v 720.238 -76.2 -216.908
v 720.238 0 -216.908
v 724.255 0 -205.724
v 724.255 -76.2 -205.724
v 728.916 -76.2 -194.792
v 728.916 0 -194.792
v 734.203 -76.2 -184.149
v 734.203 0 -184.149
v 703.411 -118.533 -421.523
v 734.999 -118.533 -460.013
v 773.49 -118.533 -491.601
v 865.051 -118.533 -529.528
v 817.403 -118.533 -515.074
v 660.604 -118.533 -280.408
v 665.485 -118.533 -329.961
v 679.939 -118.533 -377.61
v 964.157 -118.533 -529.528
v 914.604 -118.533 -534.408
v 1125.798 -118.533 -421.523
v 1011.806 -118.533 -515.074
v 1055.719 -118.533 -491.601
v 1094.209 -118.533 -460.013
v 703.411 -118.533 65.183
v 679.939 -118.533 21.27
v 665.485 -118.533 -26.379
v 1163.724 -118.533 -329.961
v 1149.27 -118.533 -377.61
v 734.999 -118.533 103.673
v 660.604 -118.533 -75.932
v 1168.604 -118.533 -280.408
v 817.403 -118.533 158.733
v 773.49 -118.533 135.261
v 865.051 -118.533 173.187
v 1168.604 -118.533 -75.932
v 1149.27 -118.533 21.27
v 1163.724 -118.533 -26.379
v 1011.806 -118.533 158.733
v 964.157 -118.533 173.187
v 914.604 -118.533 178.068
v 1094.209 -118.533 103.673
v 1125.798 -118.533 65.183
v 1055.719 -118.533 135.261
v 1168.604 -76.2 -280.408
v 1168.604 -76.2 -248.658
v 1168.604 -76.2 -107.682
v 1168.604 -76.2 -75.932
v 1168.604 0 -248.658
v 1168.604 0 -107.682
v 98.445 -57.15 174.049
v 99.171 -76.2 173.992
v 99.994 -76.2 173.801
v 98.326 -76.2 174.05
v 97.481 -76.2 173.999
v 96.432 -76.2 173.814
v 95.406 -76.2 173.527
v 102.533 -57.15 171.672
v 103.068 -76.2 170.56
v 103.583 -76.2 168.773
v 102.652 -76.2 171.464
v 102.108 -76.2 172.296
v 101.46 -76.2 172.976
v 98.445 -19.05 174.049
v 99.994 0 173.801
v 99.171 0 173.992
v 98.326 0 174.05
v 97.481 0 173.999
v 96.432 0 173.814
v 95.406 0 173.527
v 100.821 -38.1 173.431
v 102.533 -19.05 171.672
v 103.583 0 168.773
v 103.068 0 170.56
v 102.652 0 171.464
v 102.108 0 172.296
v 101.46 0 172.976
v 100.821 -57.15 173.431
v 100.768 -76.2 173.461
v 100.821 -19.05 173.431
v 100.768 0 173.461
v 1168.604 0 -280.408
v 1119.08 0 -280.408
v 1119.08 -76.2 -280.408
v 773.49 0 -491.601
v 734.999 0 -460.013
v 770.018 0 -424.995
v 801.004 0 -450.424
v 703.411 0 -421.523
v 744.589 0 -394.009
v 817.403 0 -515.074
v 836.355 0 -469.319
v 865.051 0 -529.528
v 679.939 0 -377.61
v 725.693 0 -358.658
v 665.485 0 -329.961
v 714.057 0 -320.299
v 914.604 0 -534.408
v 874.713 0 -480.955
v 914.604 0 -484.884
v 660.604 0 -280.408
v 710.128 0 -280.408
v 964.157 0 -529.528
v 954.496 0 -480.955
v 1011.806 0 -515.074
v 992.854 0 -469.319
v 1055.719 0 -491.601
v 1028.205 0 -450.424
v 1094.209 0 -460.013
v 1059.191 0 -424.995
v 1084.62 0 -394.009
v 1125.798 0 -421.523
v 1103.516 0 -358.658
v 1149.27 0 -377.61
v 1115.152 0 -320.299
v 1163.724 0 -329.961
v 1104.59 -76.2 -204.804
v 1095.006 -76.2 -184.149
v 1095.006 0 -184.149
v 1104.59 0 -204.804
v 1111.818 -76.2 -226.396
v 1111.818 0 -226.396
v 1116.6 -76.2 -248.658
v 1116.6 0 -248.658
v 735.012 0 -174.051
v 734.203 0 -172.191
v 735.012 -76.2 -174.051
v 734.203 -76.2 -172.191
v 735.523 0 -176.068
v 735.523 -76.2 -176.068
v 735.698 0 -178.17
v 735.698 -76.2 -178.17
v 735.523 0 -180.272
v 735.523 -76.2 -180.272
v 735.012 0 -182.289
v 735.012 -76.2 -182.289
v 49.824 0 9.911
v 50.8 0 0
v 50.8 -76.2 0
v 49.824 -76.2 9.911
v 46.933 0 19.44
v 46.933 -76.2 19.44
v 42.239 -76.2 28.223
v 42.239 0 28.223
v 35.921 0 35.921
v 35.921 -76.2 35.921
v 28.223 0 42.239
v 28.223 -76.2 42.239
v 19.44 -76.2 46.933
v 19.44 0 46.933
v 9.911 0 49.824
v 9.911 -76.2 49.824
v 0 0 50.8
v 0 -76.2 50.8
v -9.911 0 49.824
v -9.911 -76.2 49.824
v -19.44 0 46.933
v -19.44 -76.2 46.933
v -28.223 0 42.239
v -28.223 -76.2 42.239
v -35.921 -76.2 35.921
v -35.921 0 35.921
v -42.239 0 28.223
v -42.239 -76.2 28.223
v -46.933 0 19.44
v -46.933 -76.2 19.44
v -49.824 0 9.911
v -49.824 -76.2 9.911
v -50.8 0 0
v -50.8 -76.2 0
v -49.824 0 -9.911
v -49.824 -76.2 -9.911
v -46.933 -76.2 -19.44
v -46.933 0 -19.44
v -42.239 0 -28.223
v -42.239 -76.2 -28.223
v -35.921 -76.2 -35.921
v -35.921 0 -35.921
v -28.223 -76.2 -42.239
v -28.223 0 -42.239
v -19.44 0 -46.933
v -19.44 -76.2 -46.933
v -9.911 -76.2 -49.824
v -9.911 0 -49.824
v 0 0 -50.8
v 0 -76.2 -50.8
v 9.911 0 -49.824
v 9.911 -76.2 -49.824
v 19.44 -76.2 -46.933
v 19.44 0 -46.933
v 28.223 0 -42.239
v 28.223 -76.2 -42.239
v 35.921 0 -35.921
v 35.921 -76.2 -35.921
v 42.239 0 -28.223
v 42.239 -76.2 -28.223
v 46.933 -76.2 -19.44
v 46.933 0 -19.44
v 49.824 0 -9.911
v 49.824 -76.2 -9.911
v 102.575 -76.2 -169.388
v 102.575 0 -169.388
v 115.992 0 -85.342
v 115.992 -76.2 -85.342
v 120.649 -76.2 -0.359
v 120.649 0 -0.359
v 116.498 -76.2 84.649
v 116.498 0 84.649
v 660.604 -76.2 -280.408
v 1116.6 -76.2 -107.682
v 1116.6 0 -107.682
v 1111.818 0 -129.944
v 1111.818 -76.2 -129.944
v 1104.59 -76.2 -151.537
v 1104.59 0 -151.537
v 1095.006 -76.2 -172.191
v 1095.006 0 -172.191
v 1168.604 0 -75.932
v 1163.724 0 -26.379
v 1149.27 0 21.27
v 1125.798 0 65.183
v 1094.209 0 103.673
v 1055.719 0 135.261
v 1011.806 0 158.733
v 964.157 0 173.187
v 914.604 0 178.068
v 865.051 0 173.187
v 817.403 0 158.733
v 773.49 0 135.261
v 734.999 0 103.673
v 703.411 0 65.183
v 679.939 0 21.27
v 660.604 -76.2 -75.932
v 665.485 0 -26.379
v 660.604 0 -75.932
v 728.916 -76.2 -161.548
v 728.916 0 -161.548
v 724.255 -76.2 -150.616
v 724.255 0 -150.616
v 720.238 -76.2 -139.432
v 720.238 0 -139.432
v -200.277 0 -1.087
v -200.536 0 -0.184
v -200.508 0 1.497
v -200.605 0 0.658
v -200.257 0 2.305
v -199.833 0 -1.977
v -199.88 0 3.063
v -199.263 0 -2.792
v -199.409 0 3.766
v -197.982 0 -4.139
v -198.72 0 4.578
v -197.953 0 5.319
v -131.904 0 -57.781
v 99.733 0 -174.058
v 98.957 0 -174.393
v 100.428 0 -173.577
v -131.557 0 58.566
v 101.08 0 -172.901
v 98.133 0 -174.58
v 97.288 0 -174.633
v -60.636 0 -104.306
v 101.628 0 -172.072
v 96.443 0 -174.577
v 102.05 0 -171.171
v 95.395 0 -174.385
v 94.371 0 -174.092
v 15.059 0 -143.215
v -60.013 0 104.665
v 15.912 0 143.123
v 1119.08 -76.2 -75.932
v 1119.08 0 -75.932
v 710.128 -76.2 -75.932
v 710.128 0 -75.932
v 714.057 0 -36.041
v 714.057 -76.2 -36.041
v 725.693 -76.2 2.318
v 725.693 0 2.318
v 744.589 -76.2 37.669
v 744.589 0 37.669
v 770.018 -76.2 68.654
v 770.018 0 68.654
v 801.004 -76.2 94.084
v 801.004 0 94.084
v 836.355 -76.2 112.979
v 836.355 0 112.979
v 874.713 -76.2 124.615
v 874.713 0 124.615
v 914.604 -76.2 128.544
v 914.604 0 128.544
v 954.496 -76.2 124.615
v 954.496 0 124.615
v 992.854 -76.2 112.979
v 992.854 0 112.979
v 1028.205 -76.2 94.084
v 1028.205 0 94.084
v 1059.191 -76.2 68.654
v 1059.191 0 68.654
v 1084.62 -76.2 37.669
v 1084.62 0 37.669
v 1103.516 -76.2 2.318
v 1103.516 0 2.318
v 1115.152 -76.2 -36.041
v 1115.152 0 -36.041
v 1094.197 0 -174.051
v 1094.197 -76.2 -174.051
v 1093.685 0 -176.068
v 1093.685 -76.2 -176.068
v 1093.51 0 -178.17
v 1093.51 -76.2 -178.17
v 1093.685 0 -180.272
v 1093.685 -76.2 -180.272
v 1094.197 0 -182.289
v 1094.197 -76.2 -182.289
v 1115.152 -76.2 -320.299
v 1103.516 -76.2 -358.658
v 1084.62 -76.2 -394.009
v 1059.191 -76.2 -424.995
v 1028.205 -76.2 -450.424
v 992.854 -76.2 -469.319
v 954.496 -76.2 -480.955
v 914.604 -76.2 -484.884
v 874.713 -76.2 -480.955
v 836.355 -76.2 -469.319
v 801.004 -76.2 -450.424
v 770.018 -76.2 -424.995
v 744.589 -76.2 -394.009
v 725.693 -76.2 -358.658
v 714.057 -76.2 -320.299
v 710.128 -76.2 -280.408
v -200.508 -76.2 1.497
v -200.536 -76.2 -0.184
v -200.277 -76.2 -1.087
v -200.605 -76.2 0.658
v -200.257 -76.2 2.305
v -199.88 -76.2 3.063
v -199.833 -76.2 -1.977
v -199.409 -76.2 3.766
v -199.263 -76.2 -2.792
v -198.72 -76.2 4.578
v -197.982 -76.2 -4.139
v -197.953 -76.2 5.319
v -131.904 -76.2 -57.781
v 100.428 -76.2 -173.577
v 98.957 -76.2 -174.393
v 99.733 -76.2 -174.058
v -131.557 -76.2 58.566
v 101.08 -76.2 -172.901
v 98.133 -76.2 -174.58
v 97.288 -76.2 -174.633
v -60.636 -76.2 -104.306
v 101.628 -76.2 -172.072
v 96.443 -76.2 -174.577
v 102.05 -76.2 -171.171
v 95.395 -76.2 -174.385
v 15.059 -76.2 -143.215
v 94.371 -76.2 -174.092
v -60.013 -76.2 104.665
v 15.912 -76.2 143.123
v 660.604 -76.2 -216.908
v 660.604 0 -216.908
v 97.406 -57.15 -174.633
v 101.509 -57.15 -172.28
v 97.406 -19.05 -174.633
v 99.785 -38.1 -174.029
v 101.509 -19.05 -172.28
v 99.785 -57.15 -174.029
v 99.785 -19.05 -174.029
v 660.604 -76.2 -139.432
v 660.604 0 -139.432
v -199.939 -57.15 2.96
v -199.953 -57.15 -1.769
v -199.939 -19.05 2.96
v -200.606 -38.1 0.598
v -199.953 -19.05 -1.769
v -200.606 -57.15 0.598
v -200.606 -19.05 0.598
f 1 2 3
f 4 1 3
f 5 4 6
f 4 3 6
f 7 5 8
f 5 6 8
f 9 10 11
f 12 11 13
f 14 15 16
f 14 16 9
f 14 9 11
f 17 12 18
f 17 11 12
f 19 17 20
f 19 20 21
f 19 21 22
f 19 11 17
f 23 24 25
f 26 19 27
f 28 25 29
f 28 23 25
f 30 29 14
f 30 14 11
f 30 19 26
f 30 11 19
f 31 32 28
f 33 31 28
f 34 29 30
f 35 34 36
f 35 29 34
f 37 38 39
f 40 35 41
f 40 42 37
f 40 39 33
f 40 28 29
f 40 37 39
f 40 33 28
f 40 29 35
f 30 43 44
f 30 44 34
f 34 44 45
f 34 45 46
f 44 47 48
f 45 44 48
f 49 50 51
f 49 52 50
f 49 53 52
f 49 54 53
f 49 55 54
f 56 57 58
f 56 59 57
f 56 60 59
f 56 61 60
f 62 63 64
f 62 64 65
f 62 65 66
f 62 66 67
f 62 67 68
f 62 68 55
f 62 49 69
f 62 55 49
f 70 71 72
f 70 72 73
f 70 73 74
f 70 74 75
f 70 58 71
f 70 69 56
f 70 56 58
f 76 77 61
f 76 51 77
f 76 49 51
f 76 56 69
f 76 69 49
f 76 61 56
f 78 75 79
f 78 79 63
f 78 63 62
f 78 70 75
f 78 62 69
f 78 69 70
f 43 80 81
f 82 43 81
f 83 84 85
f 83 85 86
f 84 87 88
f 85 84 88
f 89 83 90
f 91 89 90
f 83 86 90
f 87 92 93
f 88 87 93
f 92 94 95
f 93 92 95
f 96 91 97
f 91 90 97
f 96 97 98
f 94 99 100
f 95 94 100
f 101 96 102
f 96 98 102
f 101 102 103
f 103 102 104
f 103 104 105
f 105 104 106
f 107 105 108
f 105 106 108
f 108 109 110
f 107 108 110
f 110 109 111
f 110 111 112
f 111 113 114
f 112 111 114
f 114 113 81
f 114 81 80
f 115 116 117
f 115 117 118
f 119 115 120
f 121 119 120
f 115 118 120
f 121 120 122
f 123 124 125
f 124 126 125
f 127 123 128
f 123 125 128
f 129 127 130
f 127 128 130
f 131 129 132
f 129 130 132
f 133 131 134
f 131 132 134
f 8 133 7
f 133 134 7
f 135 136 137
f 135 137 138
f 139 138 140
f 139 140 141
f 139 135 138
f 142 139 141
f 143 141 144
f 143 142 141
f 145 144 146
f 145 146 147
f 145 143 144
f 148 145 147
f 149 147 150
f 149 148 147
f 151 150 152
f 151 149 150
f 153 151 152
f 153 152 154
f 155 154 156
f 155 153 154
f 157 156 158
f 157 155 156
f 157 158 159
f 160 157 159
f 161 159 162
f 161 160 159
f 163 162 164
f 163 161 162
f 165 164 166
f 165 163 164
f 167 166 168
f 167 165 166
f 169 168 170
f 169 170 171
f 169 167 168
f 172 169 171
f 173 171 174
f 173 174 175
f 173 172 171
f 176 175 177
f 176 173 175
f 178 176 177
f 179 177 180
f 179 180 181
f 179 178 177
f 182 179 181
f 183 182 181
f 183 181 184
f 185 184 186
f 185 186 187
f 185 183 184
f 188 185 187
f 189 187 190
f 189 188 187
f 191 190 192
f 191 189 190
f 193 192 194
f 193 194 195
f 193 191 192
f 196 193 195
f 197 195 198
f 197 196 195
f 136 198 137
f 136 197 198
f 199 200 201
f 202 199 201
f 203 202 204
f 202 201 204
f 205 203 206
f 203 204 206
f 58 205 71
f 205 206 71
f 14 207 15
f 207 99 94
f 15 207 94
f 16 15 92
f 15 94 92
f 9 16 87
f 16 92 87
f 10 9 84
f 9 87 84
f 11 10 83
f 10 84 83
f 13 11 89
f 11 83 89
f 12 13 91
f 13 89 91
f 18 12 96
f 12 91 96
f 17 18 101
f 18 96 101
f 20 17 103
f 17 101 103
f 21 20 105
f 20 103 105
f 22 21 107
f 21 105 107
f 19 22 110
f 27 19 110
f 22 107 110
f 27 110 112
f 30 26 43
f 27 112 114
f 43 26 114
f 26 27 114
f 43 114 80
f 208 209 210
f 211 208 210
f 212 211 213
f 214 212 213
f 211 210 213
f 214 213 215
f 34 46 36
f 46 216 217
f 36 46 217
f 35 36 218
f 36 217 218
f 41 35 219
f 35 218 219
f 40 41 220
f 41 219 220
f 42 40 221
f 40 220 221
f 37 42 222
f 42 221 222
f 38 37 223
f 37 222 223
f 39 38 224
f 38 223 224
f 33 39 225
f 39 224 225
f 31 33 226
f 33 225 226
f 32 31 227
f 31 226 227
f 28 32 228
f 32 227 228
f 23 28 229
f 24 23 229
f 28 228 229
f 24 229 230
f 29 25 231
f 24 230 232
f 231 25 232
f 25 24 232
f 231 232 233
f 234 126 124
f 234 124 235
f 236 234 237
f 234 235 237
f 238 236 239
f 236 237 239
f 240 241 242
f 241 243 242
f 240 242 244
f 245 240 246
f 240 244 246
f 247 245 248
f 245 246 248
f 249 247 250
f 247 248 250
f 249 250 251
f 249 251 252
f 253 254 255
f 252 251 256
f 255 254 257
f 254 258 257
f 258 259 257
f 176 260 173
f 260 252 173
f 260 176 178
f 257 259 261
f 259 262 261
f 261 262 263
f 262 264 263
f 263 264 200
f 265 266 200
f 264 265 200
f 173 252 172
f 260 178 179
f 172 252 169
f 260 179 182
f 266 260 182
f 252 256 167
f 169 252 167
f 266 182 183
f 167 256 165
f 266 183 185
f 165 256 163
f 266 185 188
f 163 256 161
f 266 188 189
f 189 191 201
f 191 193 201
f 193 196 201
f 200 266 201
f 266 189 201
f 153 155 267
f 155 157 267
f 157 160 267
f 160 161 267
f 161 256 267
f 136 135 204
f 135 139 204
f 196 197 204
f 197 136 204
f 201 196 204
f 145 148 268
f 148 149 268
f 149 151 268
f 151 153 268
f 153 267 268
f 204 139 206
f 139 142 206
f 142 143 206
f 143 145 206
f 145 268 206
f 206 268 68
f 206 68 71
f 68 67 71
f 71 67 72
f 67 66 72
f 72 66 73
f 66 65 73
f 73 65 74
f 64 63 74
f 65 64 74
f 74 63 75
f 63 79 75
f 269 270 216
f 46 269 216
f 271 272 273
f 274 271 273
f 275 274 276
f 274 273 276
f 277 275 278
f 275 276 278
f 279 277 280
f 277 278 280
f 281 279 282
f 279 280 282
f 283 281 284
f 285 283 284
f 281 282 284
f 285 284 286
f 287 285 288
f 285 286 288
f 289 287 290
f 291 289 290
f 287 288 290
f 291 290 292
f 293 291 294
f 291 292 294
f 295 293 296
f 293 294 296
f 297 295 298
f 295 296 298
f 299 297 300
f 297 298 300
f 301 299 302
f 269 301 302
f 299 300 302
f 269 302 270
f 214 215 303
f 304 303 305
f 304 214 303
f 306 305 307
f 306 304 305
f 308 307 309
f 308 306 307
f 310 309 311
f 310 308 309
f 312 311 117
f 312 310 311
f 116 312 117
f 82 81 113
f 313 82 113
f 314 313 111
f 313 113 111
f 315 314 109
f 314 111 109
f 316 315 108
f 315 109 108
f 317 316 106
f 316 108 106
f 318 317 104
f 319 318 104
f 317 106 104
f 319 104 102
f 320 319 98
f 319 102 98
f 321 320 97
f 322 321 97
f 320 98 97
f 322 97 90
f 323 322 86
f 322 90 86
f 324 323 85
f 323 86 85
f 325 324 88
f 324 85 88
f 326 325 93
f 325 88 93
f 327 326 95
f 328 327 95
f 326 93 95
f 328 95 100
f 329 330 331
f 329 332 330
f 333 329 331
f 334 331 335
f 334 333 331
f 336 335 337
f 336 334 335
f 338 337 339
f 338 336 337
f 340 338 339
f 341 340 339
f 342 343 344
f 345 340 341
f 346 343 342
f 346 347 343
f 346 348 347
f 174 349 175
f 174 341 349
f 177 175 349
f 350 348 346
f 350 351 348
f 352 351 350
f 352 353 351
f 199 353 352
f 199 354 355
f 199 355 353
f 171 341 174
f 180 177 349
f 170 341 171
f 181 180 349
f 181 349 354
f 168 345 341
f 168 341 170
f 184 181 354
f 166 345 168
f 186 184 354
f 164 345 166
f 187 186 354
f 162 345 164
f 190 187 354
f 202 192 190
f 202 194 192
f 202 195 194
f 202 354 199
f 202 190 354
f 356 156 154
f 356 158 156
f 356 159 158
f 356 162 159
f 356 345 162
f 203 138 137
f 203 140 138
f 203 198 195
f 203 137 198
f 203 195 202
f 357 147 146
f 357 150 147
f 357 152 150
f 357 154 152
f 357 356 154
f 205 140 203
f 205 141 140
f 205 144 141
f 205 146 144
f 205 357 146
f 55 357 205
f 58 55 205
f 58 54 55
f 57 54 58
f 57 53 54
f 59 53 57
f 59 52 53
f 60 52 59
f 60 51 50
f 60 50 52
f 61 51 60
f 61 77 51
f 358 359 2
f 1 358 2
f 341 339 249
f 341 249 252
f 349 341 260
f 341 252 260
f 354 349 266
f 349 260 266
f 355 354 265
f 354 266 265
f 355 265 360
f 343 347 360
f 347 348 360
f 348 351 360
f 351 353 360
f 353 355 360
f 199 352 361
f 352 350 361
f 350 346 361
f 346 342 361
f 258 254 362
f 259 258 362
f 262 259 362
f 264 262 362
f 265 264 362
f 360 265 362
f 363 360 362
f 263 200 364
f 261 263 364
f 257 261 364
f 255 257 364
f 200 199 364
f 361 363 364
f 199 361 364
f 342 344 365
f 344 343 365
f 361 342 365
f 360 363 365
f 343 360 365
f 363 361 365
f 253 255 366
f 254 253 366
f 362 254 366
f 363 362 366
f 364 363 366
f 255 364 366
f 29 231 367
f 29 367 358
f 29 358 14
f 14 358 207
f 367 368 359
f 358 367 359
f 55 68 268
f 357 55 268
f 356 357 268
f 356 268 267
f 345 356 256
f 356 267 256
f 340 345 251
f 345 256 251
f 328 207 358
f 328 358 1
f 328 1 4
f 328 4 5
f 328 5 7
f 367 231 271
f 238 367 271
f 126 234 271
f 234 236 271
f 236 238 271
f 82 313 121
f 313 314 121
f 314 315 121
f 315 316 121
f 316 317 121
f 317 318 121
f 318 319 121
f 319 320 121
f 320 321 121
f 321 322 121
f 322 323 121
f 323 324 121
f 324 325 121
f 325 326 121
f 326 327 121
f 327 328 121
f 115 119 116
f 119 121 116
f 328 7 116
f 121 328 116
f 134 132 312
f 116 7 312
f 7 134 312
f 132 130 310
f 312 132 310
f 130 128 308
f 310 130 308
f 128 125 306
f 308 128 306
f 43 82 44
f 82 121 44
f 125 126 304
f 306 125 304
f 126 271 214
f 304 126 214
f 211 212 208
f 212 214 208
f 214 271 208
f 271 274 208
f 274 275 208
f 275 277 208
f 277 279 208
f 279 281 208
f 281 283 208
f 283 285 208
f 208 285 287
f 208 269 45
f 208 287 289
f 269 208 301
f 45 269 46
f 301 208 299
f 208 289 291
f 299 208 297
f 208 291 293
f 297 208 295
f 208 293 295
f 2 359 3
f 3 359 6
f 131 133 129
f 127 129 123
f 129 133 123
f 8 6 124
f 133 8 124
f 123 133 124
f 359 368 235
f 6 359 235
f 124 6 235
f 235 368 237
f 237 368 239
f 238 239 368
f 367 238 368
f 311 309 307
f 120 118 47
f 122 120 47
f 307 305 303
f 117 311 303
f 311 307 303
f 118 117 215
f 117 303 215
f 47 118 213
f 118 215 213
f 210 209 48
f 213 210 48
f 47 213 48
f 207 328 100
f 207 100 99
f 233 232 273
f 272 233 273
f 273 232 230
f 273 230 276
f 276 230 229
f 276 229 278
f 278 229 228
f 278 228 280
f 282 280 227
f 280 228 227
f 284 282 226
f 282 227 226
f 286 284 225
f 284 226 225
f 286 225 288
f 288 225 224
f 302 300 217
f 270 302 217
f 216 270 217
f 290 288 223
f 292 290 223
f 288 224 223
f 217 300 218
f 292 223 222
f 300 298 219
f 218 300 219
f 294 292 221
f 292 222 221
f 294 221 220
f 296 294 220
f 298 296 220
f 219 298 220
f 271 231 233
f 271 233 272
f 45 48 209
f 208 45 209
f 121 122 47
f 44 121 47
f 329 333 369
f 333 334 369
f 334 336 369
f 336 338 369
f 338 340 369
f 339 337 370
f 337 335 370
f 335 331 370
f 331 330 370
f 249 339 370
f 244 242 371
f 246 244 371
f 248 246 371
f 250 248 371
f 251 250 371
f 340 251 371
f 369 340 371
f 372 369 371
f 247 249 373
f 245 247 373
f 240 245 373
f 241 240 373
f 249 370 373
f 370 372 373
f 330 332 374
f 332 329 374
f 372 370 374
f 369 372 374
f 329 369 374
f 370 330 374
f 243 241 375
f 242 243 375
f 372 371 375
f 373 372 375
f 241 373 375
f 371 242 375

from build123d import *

# Parameters (mm, degrees)
F1_DEPTH    = 76.2
F2_R        = 12.7
F2_2_R      = 12.7
F4_DEPTH    = 42.3333333342
F5_R        = 50.8
F6_DEPTH    = 76.2
F7_T1_DEPTH = 111.4605556754


# Not quite as in the source:
# - a fillet or chamfer that OpenCascade refuses, or shapes differently, is made with other operations: its cross-section is extruded or revolved along the edge and cut away or added


with BuildPart() as f1:
    # F0 (on Front) → F1 (new body)
    with BuildSketch(Plane.XZ):
        with BuildLine():
            ThreePointArc((710.1282216017, -75.9319759618), (914.6043545827, 128.5441570192), (1119.0804875637, -75.9319759618))
            Line((1119.0804875637, -75.9319759618), (1168.6043545827, -75.9319759618))
            ThreePointArc((1168.6043545827, -75.9319759618), (914.6043545827, 178.0680240382), (660.6043545827, -75.9319759618))
            Line((660.6043545827, -75.9319759618), (710.1282216017, -75.9319759618))
        make_face()
    extrude(amount=F1_DEPTH)



with BuildPart() as f1b:
    # F0 (on Front) → F1, piece 2 (new body)
    with BuildSketch(Plane.XZ):
        with BuildLine():
            Line((1168.6043545827, -107.6819759618), (1116.6004596413, -107.6819759618))
            ThreePointArc((1116.6004596413, -107.6819759618), (1107.3920730747, -144.0743604042), (1091.6858802118, -178.1700424523))
            ThreePointArc((1091.6858802118, -178.1700424523), (1107.3920730747, -212.2657245004), (1116.6004596413, -248.6581089428))
            Line((1116.6004596413, -248.6581089428), (1168.6043545827, -248.6581089428))
            Line((1168.6043545827, -248.6581089428), (1168.6043545827, -107.6819759618))
        make_face()
    extrude(amount=F1_DEPTH)

    # F2#2
    f2_2_edges = [f1b.edges().sort_by_distance(p)[0] for p in [
        (1091.68588, -38.1, -178.170042),
    ]]
    fillet(f2_2_edges, radius=F2_2_R)


with BuildPart() as f1c:
    # F0 (on Front) → F1, piece 3 (new body)
    with BuildSketch(Plane.XZ):
        with BuildLine():
            ThreePointArc((737.5228289535, -178.1700424523), (727.8732059552, -159.2504438494), (720.2381050462, -139.4319759618))
            Line((720.2381050462, -139.4319759618), (660.6043545827, -139.4319759618))
            Line((660.6043545827, -139.4319759618), (660.6043545827, -216.9081089428))
            Line((660.6043545827, -216.9081089428), (720.2381050462, -216.9081089428))
            ThreePointArc((720.2381050462, -216.9081089428), (727.8732059552, -197.0896410552), (737.5228289535, -178.1700424523))
        make_face()
    extrude(amount=F1_DEPTH)

    # F2
    f2_edges = [f1c.edges().sort_by_distance(p)[0] for p in [
        (737.522829, -38.1, -178.170042),
    ]]
    fillet(f2_edges, radius=F2_R)


with BuildPart() as f1d:
    # F0 (on Front) → F1, piece 4 (new body)
    with BuildSketch(Plane.XZ):
        with BuildLine():
            Line((1168.6043545827, -280.4081089428), (1119.0804875637, -280.4081089428))
            ThreePointArc((1119.0804875637, -280.4081089428), (914.6043545827, -484.8842419238), (710.1282216017, -280.4081089428))
            Line((710.1282216017, -280.4081089428), (660.6043545827, -280.4081089428))
            ThreePointArc((660.6043545827, -280.4081089428), (914.6043545827, -534.4081089428), (1168.6043545827, -280.4081089428))
        make_face()
    extrude(amount=F1_DEPTH)


with BuildPart() as f1_1:
    add(f1.part)

    add(f1b.part)  # F4 merges F1b

    add(f1c.part)  # F4 merges F1c

    add(f1d.part)  # F4 merges F1d
    # F3 (on face) → F4 (join)
    with BuildSketch(Plane.XZ.offset(76.2)):
        with BuildLine():
            Line((1168.6043545827, -280.4081089428), (1168.6043545827, -75.9319759618))
            ThreePointArc((1168.6043545827, -75.9319759618), (914.6043545827, 178.0680240382), (660.6043545827, -75.9319759618))
            Line((660.6043545827, -75.9319759618), (660.6043545827, -280.4081089428))
            ThreePointArc((660.6043545827, -280.4081089428), (914.6043545827, -534.4081089428), (1168.6043545827, -280.4081089428))
        make_face()
    extrude(amount=F4_DEPTH)


with BuildPart() as f6:
    # F5 (on Front) → F6 (new body)
    with BuildSketch(Plane.XZ):
        with BuildLine():
            ThreePointArc((102.1237551128, 175.6729308734), (-60.0134851065, 104.6652000685), (-203.1990984501, 0.6053008208))
            Line((-203.1990984501, 0.6053008208), (102.1237551128, 175.6729308734))
        make_face()
        Polygon((102.1237551128, 175.6729308734), (-203.1990984501, 0.6053008208), (101.0753433373, -176.2782316942), align=None)
        Circle(F5_R, mode=Mode.SUBTRACT)
        with BuildLine():
            Line((101.0753433373, -176.2782316942), (-203.1990984501, 0.6053008208))
            ThreePointArc((-203.1990984501, 0.6053008208), (-60.6359795982, -104.3058027061), (101.0753433373, -176.2782316942))
        make_face()
        with BuildLine():
            ThreePointArc((101.0753433373, -176.2782316942), (120.6494647047, -0.3593973623), (102.1237551128, 175.6729308734))
            Line((102.1237551128, 175.6729308734), (101.0753433373, -176.2782316942))
        make_face()
    extrude(amount=F6_DEPTH)

    # F7: fillet of radius 6.35 on 3 edges, made by hand

    # F7_s2 → F7_t1 (cut)
    with BuildSketch(Plane.XZ.offset(-17.6302778377)):
        with BuildLine():
            add(Edge.make_bspline(
                [(95.406162744, 173.5267192743), (102.1465266623, 175.7121024143), (103.5827984, 168.7734045022)],
                knots=[0, 0, 0, 1, 1, 1], degree=2, weights=[1, 1, 1]))
            ThreePointArc((103.5827984, 168.7734045022), (102.8606729274, 172.2247317566), (102.1237551128, 175.6729308734))
            ThreePointArc((102.1237551128, 175.6729308734), (98.7626582273, 174.6070262148), (95.406162744, 173.5267192743))
        make_face()
        with BuildLine():
            add(Edge.make_bspline(
                [(94.3706565821, -174.0920370606), (101.097881112, -176.3175382051), (102.5754657549, -169.387520251)],
                knots=[0, 0, 0, 1, 1, 1], degree=2, weights=[1, 1, 1]))
            ThreePointArc((102.5754657549, -169.387520251), (101.8327912676, -172.8344840775), (101.0753433373, -176.2782316942))
            ThreePointArc((101.0753433373, -176.2782316942), (97.7206563975, -175.1923216837), (94.3706565821, -174.0920370606))
        make_face()
        with BuildLine():
            add(Edge.make_bspline(
                [(-197.9534549821, 5.3186325584), (-203.2444077743, 0.6054357907), (-197.9816284989, -4.1391990233)],
                knots=[0, 0, 0, 1, 1, 1], degree=2, weights=[1, 1, 1]))
            ThreePointArc((-197.9816284989, -4.1391990233), (-200.5954494949, -1.7725421373), (-203.1990984501, 0.6053008208))
            ThreePointArc((-203.1990984501, 0.6053008208), (-200.5813293248, 2.9675899272), (-197.9534549821, 5.3186325584))
        make_face()
    extrude(amount=F7_T1_DEPTH, mode=Mode.SUBTRACT)


solid = Compound([f1_1.part, f6.part])
